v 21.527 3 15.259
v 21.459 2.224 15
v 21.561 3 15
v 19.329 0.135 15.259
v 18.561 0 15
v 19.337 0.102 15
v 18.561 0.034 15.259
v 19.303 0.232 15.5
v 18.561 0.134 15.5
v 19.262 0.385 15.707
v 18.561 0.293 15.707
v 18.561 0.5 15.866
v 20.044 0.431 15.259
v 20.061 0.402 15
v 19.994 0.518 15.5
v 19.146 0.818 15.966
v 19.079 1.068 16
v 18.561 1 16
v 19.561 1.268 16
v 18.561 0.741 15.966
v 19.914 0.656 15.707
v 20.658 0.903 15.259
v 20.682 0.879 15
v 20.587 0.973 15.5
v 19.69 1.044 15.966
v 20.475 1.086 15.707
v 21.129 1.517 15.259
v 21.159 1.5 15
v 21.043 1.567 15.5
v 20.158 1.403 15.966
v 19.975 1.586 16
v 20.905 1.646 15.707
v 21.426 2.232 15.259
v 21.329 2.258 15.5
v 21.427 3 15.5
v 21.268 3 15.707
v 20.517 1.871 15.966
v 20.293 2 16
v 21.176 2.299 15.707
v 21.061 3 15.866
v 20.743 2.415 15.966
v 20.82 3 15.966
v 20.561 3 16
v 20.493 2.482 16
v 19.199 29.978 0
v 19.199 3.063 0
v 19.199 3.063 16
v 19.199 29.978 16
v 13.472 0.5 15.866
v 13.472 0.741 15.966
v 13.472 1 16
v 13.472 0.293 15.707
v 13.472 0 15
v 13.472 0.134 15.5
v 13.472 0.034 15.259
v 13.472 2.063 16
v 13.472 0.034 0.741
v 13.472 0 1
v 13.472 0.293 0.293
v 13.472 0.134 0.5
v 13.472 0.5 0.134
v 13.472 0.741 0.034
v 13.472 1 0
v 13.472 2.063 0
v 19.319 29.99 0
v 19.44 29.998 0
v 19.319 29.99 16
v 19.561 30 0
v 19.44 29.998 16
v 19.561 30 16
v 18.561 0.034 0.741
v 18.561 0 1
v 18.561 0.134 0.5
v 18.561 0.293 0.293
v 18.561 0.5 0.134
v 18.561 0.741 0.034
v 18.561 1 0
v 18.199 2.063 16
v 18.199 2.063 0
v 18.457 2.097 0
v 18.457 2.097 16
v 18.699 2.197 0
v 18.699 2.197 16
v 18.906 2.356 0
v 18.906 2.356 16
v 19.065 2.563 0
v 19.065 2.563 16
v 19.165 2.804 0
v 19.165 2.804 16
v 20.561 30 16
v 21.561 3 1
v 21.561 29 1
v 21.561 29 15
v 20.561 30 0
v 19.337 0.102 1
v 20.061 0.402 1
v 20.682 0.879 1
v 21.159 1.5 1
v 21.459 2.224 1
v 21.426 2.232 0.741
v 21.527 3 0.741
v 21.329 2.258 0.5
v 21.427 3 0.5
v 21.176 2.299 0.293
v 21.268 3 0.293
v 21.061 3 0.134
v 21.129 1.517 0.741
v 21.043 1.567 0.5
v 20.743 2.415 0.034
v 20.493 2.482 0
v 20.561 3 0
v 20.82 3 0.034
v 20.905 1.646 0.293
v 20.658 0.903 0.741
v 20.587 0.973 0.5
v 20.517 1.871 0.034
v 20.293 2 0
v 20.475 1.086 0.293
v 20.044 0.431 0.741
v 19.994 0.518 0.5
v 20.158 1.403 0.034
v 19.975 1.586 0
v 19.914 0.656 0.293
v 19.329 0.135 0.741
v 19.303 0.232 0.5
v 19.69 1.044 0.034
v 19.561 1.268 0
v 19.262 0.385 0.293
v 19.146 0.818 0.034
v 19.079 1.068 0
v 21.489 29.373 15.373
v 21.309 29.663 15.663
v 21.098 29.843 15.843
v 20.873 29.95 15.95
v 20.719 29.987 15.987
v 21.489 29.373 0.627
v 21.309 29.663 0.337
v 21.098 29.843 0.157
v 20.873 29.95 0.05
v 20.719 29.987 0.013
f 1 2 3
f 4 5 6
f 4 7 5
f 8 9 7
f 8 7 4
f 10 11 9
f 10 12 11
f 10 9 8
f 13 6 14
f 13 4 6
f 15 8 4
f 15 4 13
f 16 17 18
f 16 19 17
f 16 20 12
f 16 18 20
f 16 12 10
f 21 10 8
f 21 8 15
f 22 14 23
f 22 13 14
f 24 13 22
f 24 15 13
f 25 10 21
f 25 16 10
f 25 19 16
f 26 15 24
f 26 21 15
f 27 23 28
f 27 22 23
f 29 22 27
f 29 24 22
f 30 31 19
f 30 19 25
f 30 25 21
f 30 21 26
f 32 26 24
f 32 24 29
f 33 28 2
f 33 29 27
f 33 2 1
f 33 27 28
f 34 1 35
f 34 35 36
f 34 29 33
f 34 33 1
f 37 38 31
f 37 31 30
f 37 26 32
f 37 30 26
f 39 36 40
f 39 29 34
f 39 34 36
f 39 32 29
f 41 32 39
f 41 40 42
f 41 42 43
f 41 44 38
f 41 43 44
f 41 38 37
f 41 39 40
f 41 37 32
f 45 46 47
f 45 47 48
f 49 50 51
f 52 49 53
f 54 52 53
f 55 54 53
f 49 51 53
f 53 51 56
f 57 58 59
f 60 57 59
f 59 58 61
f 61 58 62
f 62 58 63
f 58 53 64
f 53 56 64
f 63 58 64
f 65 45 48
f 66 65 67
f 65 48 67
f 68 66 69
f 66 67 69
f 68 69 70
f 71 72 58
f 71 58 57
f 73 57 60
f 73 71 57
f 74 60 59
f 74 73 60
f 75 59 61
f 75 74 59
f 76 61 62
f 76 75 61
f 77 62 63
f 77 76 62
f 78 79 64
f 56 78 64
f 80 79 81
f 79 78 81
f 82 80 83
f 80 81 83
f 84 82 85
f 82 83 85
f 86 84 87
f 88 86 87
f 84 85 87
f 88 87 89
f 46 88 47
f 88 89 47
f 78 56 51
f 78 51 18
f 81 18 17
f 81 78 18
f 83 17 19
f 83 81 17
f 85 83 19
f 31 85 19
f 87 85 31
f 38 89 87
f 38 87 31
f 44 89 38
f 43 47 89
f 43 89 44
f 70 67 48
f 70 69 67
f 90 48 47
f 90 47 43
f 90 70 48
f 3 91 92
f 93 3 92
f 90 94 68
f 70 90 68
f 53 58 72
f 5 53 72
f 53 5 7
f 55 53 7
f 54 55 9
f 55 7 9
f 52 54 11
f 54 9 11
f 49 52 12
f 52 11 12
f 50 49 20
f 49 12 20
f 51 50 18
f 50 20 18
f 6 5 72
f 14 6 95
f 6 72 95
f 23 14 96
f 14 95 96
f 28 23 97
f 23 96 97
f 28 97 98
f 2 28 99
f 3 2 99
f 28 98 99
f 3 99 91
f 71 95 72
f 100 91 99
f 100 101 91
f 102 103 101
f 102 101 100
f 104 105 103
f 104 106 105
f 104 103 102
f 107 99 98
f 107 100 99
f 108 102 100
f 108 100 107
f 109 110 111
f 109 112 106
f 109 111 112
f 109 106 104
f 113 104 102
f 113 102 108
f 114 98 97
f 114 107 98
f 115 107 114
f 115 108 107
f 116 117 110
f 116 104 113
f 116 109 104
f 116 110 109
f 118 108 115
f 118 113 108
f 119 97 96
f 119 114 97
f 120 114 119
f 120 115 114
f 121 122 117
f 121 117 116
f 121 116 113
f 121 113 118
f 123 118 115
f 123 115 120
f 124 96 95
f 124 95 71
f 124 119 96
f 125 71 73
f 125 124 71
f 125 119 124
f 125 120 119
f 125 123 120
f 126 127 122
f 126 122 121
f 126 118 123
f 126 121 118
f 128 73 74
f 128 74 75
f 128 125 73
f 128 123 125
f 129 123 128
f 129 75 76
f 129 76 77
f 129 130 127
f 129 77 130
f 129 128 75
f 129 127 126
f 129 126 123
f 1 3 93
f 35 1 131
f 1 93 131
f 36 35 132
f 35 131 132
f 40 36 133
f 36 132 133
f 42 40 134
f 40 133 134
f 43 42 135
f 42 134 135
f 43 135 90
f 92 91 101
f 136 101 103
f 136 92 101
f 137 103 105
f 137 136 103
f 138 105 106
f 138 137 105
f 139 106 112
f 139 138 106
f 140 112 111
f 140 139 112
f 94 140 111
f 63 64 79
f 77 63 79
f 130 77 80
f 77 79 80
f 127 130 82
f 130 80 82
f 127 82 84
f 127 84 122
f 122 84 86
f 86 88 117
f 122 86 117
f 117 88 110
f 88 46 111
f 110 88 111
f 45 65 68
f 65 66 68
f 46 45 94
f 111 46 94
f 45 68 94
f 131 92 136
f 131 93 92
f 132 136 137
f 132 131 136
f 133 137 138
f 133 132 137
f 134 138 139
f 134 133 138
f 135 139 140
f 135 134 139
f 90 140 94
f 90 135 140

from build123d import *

# Parameters (mm, degrees)
BOSS_EXTRUDE1_DEPTH = 16
FILLET1_R           = 1
FILLET2_R           = 3
FILLET3_R           = 3
FILLET4_R           = 3
SKETCH2_W           = 7.425804379
SKETCH2_H           = 16
CUT_EXTRUDE1_DEPTH  = 13
FILLET5_R           = 3
SKETCH3_W           = 17.675238391
SKETCH3_H           = 28.7828695
CUT_EXTRUDE2_DEPTH  = 33
FILLET6_R           = 1
SKETCH4_W           = 6.794443954
SKETCH4_H           = 18.076730961
CUT_EXTRUDE3_DEPTH  = 33


with BuildPart() as part:
    # Sketch1 → Boss-Extrude1 (new body)
    with BuildSketch(Plane.XY):
        Polygon((0, 0), (21.560913706, 0), (21.560913706, 30), (16.560913706, 30), (16.560913706, 5), (0, 5), align=None)
    extrude(amount=BOSS_EXTRUDE1_DEPTH)

    # Fillet1
    fillet1_edges = [part.edges().sort_by_distance(p)[0] for p in [
        (21.560913706, 30, 8),
        (0, 0, 8),
        (21.560913706, 15, 16),
        (21.560913706, 15, 0),
        (10.780456853, 0, 0),
        (10.780456853, 0, 16),
    ]]
    fillet(fillet1_edges, radius=FILLET1_R)

    # Fillet2
    # the kernel refuses this fillet: 3 mm, written as the material it takes off along each edge
    with BuildSketch(Plane(origin=(18.560913706, 3, 16), x_dir=(0, -1, 0), z_dir=(-1, 0, 0))) as fillet2_piece_1:
        with BuildLine():
            CenterArc((2, -1), 1, 0, 90)
            Line((3, -1), (3, 0))
            Line((3, 0), (2, 0))
        make_face()
    revolve(axis=Axis((18.560913706, 3, 16), (0, 0, 1)), revolution_arc=90, mode=Mode.SUBTRACT)
    with BuildSketch(Plane(origin=(18.560913706, 3, 0), x_dir=(1, 0, 0), z_dir=(0, 1, 0))) as fillet2_piece_2:
        with BuildLine():
            CenterArc((2, -1), 1, 0, 90)
            Line((3, -1), (3, 0))
            Line((3, 0), (2, 0))
        make_face()
    revolve(axis=Axis((18.560913706, 3, 0), (0, 0, -1)), revolution_arc=90, mode=Mode.SUBTRACT)
    with BuildSketch(Plane(origin=(21.560913706, 0, 0), x_dir=(-1, 0, 0), z_dir=(0, 0, 1))) as fillet2_piece_3:
        with BuildLine():
            CenterArc((FILLET2_R, -FILLET2_R), FILLET2_R, 90, 90)
            Line((0, -FILLET2_R), (0, 0))
            Line((0, 0), (FILLET2_R, 0))
        make_face()
    extrude(amount=16, mode=Mode.SUBTRACT)

    # Fillet3
    fillet3_edges = [part.edges().sort_by_distance(p)[0] for p in [
        (16.560913706, 5, 8),
    ]]
    fillet(fillet3_edges, radius=FILLET3_R)

    # Fillet4
    fillet4_edges = [part.edges().sort_by_distance(p)[0] for p in [
        (0, 5, 8),
        (16.560913706, 30, 8),
    ]]
    fillet(fillet4_edges, radius=FILLET4_R)

    # Sketch2 → Cut-Extrude1 (cut)
    with BuildSketch(Plane.XZ):
        with Locations((3.71290219, 8)):
            Rectangle(SKETCH2_W, SKETCH2_H)
    extrude(amount=-CUT_EXTRUDE1_DEPTH, mode=Mode.SUBTRACT)

    # Fillet5
    fillet5_edges = [part.edges().sort_by_distance(p)[0] for p in [
        (7.425804379, 5, 8),
    ]]
    fillet(fillet5_edges, radius=FILLET5_R)

    # Sketch3 → Cut-Extrude2 (cut)
    with BuildSketch(Plane(origin=(0, 0, 0), x_dir=(-1, 0, 0), z_dir=(0, 0, -1))):
        with Locations((-10.361055803, 16.45457074)):
            Rectangle(SKETCH3_W, SKETCH3_H)
    extrude(amount=-CUT_EXTRUDE2_DEPTH, mode=Mode.SUBTRACT)

    # Fillet6
    fillet6_edges = [part.edges().sort_by_distance(p)[0] for p in [
        (19.198674998, 2.06313599, 8),
    ]]
    fillet(fillet6_edges, radius=FILLET6_R)

    # Sketch4 → Cut-Extrude3 (cut)
    with BuildSketch(Plane(origin=(0, 2.06313599, 0), x_dir=(1, 0, 0), z_dir=(0, 1, 0))):
        with Locations((10.074463298, -8.207535366)):
            Rectangle(SKETCH4_W, SKETCH4_H)
    extrude(amount=-CUT_EXTRUDE3_DEPTH, mode=Mode.SUBTRACT)


solid = part.part
